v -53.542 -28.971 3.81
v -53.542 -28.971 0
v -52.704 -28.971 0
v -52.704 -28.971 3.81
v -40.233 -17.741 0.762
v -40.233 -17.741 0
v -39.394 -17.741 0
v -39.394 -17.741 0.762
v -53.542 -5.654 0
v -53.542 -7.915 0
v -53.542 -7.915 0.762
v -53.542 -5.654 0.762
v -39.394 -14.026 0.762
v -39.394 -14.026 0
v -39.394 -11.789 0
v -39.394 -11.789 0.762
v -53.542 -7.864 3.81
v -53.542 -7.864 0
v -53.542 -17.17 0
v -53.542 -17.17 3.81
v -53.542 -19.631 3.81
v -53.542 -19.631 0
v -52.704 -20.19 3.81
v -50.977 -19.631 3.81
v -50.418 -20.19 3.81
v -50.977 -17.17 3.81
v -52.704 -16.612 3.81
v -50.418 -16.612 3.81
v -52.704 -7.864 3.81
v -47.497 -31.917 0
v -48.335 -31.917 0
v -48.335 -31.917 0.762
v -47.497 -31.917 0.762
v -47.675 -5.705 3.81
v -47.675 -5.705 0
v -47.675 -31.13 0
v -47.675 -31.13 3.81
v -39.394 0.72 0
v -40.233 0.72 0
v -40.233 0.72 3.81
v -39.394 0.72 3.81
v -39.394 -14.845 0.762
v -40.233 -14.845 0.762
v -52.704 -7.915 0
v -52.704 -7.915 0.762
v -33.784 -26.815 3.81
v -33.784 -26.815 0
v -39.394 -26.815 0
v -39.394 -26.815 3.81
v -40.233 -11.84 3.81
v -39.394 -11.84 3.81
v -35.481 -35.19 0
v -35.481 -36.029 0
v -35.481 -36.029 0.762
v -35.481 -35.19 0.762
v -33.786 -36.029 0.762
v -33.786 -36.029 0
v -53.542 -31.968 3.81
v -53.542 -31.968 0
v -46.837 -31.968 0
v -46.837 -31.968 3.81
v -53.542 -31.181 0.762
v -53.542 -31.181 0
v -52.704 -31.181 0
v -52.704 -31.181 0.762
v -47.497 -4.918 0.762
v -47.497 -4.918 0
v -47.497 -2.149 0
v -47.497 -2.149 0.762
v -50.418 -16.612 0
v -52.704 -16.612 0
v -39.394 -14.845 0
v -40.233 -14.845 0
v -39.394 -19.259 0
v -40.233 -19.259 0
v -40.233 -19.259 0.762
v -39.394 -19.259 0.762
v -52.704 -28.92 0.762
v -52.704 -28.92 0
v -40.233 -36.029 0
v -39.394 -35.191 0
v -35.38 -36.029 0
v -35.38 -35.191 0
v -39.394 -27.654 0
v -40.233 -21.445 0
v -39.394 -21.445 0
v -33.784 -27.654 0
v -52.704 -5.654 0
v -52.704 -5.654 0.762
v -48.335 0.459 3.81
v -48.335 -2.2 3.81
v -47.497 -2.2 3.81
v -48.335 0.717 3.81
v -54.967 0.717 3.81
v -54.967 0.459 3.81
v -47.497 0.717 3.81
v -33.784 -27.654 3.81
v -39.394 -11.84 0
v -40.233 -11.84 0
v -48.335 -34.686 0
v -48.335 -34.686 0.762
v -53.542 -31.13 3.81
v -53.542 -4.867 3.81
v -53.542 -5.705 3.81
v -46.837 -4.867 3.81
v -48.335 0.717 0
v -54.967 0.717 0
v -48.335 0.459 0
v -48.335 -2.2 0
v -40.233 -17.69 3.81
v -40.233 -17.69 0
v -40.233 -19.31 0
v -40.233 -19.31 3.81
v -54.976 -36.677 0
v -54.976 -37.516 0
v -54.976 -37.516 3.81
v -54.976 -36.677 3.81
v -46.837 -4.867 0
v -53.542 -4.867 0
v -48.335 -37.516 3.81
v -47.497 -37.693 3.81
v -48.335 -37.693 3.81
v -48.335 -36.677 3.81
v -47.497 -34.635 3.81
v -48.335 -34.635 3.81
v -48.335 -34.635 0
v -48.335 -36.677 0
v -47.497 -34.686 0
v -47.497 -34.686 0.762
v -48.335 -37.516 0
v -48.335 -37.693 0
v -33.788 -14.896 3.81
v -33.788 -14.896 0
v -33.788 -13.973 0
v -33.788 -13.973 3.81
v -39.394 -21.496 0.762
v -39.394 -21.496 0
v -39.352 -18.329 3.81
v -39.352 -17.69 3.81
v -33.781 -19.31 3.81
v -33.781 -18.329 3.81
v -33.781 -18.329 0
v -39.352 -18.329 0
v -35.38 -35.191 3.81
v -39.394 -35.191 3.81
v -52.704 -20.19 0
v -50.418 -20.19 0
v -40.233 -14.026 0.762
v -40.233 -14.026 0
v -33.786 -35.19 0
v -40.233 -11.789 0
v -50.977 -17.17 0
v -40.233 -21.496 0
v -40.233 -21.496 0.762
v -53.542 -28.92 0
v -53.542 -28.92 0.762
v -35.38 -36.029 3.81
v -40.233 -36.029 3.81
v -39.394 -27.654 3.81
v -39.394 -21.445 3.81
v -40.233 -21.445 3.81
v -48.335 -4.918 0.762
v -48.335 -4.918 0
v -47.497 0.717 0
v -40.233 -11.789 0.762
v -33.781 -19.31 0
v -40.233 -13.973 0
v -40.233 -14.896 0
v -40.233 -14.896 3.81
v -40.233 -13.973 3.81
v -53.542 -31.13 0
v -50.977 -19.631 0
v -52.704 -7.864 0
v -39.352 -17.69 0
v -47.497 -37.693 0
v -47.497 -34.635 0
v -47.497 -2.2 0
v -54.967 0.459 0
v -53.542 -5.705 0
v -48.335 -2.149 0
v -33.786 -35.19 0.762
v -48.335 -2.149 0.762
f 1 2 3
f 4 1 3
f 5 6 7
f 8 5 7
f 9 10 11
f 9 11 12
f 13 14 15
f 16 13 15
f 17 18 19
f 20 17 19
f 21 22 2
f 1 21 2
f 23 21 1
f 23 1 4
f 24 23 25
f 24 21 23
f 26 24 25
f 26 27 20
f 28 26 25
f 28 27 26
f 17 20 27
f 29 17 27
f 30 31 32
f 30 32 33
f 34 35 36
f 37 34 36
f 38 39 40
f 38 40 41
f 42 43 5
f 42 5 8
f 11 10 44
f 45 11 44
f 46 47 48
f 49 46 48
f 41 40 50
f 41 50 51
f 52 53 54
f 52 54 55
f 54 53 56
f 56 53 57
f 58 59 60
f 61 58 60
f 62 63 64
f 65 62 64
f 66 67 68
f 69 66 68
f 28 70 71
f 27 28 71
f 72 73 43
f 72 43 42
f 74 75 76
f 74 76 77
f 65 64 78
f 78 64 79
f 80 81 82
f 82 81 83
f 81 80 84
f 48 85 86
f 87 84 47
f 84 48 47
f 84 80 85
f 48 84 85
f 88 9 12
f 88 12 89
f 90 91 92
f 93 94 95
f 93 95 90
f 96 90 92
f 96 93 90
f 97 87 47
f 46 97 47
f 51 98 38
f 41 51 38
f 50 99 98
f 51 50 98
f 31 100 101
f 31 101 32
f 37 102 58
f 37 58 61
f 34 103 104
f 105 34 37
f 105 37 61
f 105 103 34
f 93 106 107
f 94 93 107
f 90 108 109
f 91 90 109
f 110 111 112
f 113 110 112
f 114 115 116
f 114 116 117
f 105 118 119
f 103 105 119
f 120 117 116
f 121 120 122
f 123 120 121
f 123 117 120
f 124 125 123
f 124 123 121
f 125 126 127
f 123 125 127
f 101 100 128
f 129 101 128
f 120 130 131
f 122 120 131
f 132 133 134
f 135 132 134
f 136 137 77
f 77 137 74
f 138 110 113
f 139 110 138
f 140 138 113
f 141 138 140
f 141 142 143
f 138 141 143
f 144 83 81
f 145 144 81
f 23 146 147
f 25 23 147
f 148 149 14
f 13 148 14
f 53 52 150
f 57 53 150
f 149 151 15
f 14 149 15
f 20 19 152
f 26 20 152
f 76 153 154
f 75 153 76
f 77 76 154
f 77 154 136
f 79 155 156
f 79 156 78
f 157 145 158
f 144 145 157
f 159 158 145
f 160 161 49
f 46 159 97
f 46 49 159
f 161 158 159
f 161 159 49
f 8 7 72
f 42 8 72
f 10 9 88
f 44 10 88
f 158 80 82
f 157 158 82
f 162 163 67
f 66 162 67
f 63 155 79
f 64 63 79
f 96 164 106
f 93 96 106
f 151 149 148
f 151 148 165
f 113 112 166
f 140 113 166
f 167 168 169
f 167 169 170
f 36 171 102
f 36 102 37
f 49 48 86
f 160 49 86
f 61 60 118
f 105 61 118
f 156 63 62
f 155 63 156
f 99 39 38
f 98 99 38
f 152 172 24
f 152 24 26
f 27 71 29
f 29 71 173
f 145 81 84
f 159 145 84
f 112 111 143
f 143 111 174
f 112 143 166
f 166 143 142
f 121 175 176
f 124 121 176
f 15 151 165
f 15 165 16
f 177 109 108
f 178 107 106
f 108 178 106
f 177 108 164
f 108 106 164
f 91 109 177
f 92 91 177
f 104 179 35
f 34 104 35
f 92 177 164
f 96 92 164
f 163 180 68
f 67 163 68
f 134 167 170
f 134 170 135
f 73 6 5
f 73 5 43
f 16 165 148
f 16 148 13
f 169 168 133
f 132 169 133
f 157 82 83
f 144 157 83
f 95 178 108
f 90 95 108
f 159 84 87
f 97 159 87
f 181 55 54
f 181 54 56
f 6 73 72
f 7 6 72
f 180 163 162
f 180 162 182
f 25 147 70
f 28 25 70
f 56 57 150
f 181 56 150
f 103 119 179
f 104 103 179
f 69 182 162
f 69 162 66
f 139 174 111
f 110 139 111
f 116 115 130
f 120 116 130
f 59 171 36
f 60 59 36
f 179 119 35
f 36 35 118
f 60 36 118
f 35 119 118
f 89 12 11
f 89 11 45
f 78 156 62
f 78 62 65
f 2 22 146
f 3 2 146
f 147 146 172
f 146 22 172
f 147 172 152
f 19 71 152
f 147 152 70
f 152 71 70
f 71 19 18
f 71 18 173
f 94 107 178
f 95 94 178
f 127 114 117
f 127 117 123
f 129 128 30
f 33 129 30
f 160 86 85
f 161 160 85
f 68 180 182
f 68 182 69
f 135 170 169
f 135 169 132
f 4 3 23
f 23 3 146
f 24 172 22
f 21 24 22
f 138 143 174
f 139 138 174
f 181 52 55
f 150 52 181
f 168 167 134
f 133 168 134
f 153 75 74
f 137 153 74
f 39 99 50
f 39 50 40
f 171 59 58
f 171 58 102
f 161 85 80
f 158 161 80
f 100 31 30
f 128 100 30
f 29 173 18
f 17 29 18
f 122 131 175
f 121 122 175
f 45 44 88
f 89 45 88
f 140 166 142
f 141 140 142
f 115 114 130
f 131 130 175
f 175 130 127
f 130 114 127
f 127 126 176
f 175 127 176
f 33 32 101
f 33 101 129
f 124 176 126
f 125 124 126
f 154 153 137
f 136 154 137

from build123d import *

# Parameters (mm, degrees)
F1_DEPTH = 3.81
F0_W     = 0.0016617535
F0_H     = 0.8382
F0_W_2   = 5.6088228764
F0_W_3   = 0.0049910592
F0_H_2   = 0.9810682386
F0_W_4   = 5.5669181896
F0_W_5   = 0.8382
F0_H_3   = 12.5598123049
F0_W_6   = 6.4442373921
F0_H_4   = 0.9225998074
F0_W_7   = 5.8674
F0_W_8   = 0.5588
F0_H_5   = 2.4610901317
F0_W_9   = 6.6410191357
F2_W     = 0.8382
F2_H     = 2.2369018
F3_DEPTH = 0.762
F2_H_2   = 2.8956
F2_H_3   = 2.2606
F2_W_2   = 1.6959072
F2_H_4   = 0.8382
F2_H_5   = 2.7686


# Not quite as in the source:
# - ends of sketch curves that miss each other by under 0.0002 mm in the source are joined


with BuildPart() as f1:
    # F0 (on Top) → F1 (new body)
    with BuildSketch(Plane.XY):
        Polygon((-47.496972236, -2.1997114257), (-47.496972236, 0.7173087654), (-48.335172236, 0.7173087654), (-48.335172236, 0.4585053894), (-48.335172236, -2.1997114257), align=None)
        Polygon((-48.335172236, 0.4585053894), (-48.335172236, 0.7173087654), (-54.9666435823, 0.7173984171), (-54.9666435823, 0.4585053894), align=None)
    extrude(amount=F1_DEPTH)


with BuildPart() as f1b:
    # F0 (on Top) → F1, piece 2 (new body)
    with BuildSketch(Plane.XY):
        with Locations((-33.7847184829, -27.2344640045)):
            Rectangle(F0_W, F0_H)
        with Locations((-36.5899607978, -27.2344640045)):
            Rectangle(F0_W_2, F0_H)
        Polygon((-39.394372236, -27.6535640045), (-39.394372236, -26.8153640045), (-39.394372236, -21.4452373369), (-40.232572236, -21.4452373369), (-40.232572236, -35.1905039115), (-39.394372236, -35.1905039115), align=None)
        Polygon((-35.379845649, -35.1905039115), (-39.394372236, -35.1905039115), (-40.232572236, -35.1905039115), (-40.232572236, -36.0287039115), (-35.379845649, -36.0287039115), align=None)
    extrude(amount=F1_DEPTH)


with BuildPart() as f1c:
    # F0 (on Top) → F1, piece 3 (new body)
    with BuildSketch(Plane.XY):
        with Locations((-33.78305383, -18.8194096594)):
            Rectangle(F0_W_3, F0_H_2)
        with Locations((-36.5690084544, -18.8194096594)):
            Rectangle(F0_W_4, F0_H_2)
        Polygon((-39.3524675492, -19.3099437787), (-39.3524675492, -18.3288755401), (-39.3524675492, -17.690040408), (-40.232572236, -17.690040408), (-40.232572236, -19.3099437787), align=None)
    extrude(amount=F1_DEPTH)


with BuildPart() as f1d:
    # F0 (on Top) → F1, piece 4 (new body)
    with BuildSketch(Plane.XY):
        with Locations((-39.813472236, -5.5599344481)):
            Rectangle(F0_W_5, F0_H_3)
    extrude(amount=F1_DEPTH)


with BuildPart() as f1e:
    # F0 (on Top) → F1, piece 5 (new body)
    with BuildSketch(Plane.XY):
        with Locations((-37.0104535399, -14.4347405043)):
            Rectangle(F0_W_6, F0_H_4)
    extrude(amount=F1_DEPTH)


with BuildPart() as f1f:
    # F0 (on Top) → F1, piece 6 (new body)
    with BuildSketch(Plane.XY):
        Polygon((-46.836572236, -4.8667114257), (-53.542172236, -4.8667114257), (-53.542172236, -5.7049114257), (-47.674772236, -5.7049114257), (-46.836572236, -5.7049114257), align=None)
        Polygon((-46.836572236, -31.9681875408), (-46.836572236, -5.7049114257), (-47.674772236, -5.7049114257), (-47.674772236, -31.1299875408), (-47.674772236, -31.9681875408), align=None)
        with Locations((-50.608472236, -31.5490875408)):
            Rectangle(F0_W_7, F0_H)
    extrude(amount=F1_DEPTH)


with BuildPart() as f1g:
    # F0 (on Top) → F1, piece 7 (new body)
    with BuildSketch(Plane.XY):
        Polygon((-52.703972236, -7.8639114257), (-53.542172236, -7.8639114257), (-53.542172236, -17.1703245472), (-52.703972236, -17.1703245472), (-52.703972236, -16.6115245472), align=None)
        Polygon((-50.417972236, -16.6115245472), (-52.703972236, -16.6115245472), (-52.703972236, -17.1703245472), (-50.976772236, -17.1703245472), (-50.417972236, -17.1703245472), align=None)
        with Locations((-50.697372236, -18.4008696131)):
            Rectangle(F0_W_8, F0_H_5)
        Polygon((-50.417972236, -19.631414679), (-50.976772236, -19.631414679), (-52.703972236, -19.631414679), (-52.703972236, -20.190214679), (-50.417972236, -20.190214679), align=None)
        Polygon((-52.703972236, -20.190214679), (-52.703972236, -19.631414679), (-53.542172236, -19.631414679), (-53.542172236, -28.9709875408), (-52.703972236, -28.9709875408), align=None)
    extrude(amount=F1_DEPTH)


with BuildPart() as f1h:
    # F0 (on Top) → F1, piece 8 (new body)
    with BuildSketch(Plane.XY):
        Polygon((-47.496972236, -34.6351875408), (-48.335172236, -34.6351875408), (-48.335172236, -36.6773806541), (-48.335172236, -37.5155806541), (-48.335172236, -37.6932546496), (-47.496972236, -37.6932546496), align=None)
        with Locations((-51.6556818038, -37.0964806541)):
            Rectangle(F0_W_9, F0_H)
    extrude(amount=F1_DEPTH)


with BuildPart() as f3:
    # F2 (on Top) → F3 (new body)
    with BuildSketch(Plane.XY):
        with Locations((-39.8135535358, -12.9074915006)):
            Rectangle(F2_W, F2_H)
    extrude(amount=F3_DEPTH)


with BuildPart() as f3b:
    # F2 (on Top) → F3, piece 2 (new body)
    with BuildSketch(Plane.XY):
        with Locations((-39.813451476, -16.293040408)):
            Rectangle(F2_W, F2_H_2)
    extrude(amount=F3_DEPTH)


with BuildPart() as f3c:
    # F2 (on Top) → F3, piece 3 (new body)
    with BuildSketch(Plane.XY):
        with Locations((-53.1226970702, -6.7844114257)):
            Rectangle(F2_W, F2_H_3)
    extrude(amount=F3_DEPTH)


with BuildPart() as f3d:
    # F2 (on Top) → F3, piece 4 (new body)
    with BuildSketch(Plane.XY):
        with Locations((-53.1230546267, -30.0504875408)):
            Rectangle(F2_W, F2_H_3)
    extrude(amount=F3_DEPTH)


with BuildPart() as f3e:
    # F2 (on Top) → F3, piece 5 (new body)
    with BuildSketch(Plane.XY):
        with Locations((-34.633492049, -35.6095951541)):
            Rectangle(F2_W_2, F2_H_4)
    extrude(amount=F3_DEPTH)


with BuildPart() as f3f:
    # F2 (on Top) → F3, piece 6 (new body)
    with BuildSketch(Plane.XY):
        with Locations((-39.8135408784, -20.3775946787)):
            Rectangle(F2_W, F2_H)
    extrude(amount=F3_DEPTH)


with BuildPart() as f3g:
    # F2 (on Top) → F3, piece 7 (new body)
    with BuildSketch(Plane.XY):
        with Locations((-47.9158710703, -3.5332114257)):
            Rectangle(F2_W, F2_H_5)
    extrude(amount=F3_DEPTH)


with BuildPart() as f3h:
    # F2 (on Top) → F3, piece 8 (new body)
    with BuildSketch(Plane.XY):
        with Locations((-47.9160200819, -33.3016875408)):
            Rectangle(F2_W, F2_H_5)
    extrude(amount=F3_DEPTH)


solid = Compound([f1.part, f1b.part, f1c.part, f1d.part, f1e.part, f1f.part, f1g.part, f1h.part, f3.part, f3b.part, f3c.part, f3d.part, f3e.part, f3f.part, f3g.part, f3h.part])
